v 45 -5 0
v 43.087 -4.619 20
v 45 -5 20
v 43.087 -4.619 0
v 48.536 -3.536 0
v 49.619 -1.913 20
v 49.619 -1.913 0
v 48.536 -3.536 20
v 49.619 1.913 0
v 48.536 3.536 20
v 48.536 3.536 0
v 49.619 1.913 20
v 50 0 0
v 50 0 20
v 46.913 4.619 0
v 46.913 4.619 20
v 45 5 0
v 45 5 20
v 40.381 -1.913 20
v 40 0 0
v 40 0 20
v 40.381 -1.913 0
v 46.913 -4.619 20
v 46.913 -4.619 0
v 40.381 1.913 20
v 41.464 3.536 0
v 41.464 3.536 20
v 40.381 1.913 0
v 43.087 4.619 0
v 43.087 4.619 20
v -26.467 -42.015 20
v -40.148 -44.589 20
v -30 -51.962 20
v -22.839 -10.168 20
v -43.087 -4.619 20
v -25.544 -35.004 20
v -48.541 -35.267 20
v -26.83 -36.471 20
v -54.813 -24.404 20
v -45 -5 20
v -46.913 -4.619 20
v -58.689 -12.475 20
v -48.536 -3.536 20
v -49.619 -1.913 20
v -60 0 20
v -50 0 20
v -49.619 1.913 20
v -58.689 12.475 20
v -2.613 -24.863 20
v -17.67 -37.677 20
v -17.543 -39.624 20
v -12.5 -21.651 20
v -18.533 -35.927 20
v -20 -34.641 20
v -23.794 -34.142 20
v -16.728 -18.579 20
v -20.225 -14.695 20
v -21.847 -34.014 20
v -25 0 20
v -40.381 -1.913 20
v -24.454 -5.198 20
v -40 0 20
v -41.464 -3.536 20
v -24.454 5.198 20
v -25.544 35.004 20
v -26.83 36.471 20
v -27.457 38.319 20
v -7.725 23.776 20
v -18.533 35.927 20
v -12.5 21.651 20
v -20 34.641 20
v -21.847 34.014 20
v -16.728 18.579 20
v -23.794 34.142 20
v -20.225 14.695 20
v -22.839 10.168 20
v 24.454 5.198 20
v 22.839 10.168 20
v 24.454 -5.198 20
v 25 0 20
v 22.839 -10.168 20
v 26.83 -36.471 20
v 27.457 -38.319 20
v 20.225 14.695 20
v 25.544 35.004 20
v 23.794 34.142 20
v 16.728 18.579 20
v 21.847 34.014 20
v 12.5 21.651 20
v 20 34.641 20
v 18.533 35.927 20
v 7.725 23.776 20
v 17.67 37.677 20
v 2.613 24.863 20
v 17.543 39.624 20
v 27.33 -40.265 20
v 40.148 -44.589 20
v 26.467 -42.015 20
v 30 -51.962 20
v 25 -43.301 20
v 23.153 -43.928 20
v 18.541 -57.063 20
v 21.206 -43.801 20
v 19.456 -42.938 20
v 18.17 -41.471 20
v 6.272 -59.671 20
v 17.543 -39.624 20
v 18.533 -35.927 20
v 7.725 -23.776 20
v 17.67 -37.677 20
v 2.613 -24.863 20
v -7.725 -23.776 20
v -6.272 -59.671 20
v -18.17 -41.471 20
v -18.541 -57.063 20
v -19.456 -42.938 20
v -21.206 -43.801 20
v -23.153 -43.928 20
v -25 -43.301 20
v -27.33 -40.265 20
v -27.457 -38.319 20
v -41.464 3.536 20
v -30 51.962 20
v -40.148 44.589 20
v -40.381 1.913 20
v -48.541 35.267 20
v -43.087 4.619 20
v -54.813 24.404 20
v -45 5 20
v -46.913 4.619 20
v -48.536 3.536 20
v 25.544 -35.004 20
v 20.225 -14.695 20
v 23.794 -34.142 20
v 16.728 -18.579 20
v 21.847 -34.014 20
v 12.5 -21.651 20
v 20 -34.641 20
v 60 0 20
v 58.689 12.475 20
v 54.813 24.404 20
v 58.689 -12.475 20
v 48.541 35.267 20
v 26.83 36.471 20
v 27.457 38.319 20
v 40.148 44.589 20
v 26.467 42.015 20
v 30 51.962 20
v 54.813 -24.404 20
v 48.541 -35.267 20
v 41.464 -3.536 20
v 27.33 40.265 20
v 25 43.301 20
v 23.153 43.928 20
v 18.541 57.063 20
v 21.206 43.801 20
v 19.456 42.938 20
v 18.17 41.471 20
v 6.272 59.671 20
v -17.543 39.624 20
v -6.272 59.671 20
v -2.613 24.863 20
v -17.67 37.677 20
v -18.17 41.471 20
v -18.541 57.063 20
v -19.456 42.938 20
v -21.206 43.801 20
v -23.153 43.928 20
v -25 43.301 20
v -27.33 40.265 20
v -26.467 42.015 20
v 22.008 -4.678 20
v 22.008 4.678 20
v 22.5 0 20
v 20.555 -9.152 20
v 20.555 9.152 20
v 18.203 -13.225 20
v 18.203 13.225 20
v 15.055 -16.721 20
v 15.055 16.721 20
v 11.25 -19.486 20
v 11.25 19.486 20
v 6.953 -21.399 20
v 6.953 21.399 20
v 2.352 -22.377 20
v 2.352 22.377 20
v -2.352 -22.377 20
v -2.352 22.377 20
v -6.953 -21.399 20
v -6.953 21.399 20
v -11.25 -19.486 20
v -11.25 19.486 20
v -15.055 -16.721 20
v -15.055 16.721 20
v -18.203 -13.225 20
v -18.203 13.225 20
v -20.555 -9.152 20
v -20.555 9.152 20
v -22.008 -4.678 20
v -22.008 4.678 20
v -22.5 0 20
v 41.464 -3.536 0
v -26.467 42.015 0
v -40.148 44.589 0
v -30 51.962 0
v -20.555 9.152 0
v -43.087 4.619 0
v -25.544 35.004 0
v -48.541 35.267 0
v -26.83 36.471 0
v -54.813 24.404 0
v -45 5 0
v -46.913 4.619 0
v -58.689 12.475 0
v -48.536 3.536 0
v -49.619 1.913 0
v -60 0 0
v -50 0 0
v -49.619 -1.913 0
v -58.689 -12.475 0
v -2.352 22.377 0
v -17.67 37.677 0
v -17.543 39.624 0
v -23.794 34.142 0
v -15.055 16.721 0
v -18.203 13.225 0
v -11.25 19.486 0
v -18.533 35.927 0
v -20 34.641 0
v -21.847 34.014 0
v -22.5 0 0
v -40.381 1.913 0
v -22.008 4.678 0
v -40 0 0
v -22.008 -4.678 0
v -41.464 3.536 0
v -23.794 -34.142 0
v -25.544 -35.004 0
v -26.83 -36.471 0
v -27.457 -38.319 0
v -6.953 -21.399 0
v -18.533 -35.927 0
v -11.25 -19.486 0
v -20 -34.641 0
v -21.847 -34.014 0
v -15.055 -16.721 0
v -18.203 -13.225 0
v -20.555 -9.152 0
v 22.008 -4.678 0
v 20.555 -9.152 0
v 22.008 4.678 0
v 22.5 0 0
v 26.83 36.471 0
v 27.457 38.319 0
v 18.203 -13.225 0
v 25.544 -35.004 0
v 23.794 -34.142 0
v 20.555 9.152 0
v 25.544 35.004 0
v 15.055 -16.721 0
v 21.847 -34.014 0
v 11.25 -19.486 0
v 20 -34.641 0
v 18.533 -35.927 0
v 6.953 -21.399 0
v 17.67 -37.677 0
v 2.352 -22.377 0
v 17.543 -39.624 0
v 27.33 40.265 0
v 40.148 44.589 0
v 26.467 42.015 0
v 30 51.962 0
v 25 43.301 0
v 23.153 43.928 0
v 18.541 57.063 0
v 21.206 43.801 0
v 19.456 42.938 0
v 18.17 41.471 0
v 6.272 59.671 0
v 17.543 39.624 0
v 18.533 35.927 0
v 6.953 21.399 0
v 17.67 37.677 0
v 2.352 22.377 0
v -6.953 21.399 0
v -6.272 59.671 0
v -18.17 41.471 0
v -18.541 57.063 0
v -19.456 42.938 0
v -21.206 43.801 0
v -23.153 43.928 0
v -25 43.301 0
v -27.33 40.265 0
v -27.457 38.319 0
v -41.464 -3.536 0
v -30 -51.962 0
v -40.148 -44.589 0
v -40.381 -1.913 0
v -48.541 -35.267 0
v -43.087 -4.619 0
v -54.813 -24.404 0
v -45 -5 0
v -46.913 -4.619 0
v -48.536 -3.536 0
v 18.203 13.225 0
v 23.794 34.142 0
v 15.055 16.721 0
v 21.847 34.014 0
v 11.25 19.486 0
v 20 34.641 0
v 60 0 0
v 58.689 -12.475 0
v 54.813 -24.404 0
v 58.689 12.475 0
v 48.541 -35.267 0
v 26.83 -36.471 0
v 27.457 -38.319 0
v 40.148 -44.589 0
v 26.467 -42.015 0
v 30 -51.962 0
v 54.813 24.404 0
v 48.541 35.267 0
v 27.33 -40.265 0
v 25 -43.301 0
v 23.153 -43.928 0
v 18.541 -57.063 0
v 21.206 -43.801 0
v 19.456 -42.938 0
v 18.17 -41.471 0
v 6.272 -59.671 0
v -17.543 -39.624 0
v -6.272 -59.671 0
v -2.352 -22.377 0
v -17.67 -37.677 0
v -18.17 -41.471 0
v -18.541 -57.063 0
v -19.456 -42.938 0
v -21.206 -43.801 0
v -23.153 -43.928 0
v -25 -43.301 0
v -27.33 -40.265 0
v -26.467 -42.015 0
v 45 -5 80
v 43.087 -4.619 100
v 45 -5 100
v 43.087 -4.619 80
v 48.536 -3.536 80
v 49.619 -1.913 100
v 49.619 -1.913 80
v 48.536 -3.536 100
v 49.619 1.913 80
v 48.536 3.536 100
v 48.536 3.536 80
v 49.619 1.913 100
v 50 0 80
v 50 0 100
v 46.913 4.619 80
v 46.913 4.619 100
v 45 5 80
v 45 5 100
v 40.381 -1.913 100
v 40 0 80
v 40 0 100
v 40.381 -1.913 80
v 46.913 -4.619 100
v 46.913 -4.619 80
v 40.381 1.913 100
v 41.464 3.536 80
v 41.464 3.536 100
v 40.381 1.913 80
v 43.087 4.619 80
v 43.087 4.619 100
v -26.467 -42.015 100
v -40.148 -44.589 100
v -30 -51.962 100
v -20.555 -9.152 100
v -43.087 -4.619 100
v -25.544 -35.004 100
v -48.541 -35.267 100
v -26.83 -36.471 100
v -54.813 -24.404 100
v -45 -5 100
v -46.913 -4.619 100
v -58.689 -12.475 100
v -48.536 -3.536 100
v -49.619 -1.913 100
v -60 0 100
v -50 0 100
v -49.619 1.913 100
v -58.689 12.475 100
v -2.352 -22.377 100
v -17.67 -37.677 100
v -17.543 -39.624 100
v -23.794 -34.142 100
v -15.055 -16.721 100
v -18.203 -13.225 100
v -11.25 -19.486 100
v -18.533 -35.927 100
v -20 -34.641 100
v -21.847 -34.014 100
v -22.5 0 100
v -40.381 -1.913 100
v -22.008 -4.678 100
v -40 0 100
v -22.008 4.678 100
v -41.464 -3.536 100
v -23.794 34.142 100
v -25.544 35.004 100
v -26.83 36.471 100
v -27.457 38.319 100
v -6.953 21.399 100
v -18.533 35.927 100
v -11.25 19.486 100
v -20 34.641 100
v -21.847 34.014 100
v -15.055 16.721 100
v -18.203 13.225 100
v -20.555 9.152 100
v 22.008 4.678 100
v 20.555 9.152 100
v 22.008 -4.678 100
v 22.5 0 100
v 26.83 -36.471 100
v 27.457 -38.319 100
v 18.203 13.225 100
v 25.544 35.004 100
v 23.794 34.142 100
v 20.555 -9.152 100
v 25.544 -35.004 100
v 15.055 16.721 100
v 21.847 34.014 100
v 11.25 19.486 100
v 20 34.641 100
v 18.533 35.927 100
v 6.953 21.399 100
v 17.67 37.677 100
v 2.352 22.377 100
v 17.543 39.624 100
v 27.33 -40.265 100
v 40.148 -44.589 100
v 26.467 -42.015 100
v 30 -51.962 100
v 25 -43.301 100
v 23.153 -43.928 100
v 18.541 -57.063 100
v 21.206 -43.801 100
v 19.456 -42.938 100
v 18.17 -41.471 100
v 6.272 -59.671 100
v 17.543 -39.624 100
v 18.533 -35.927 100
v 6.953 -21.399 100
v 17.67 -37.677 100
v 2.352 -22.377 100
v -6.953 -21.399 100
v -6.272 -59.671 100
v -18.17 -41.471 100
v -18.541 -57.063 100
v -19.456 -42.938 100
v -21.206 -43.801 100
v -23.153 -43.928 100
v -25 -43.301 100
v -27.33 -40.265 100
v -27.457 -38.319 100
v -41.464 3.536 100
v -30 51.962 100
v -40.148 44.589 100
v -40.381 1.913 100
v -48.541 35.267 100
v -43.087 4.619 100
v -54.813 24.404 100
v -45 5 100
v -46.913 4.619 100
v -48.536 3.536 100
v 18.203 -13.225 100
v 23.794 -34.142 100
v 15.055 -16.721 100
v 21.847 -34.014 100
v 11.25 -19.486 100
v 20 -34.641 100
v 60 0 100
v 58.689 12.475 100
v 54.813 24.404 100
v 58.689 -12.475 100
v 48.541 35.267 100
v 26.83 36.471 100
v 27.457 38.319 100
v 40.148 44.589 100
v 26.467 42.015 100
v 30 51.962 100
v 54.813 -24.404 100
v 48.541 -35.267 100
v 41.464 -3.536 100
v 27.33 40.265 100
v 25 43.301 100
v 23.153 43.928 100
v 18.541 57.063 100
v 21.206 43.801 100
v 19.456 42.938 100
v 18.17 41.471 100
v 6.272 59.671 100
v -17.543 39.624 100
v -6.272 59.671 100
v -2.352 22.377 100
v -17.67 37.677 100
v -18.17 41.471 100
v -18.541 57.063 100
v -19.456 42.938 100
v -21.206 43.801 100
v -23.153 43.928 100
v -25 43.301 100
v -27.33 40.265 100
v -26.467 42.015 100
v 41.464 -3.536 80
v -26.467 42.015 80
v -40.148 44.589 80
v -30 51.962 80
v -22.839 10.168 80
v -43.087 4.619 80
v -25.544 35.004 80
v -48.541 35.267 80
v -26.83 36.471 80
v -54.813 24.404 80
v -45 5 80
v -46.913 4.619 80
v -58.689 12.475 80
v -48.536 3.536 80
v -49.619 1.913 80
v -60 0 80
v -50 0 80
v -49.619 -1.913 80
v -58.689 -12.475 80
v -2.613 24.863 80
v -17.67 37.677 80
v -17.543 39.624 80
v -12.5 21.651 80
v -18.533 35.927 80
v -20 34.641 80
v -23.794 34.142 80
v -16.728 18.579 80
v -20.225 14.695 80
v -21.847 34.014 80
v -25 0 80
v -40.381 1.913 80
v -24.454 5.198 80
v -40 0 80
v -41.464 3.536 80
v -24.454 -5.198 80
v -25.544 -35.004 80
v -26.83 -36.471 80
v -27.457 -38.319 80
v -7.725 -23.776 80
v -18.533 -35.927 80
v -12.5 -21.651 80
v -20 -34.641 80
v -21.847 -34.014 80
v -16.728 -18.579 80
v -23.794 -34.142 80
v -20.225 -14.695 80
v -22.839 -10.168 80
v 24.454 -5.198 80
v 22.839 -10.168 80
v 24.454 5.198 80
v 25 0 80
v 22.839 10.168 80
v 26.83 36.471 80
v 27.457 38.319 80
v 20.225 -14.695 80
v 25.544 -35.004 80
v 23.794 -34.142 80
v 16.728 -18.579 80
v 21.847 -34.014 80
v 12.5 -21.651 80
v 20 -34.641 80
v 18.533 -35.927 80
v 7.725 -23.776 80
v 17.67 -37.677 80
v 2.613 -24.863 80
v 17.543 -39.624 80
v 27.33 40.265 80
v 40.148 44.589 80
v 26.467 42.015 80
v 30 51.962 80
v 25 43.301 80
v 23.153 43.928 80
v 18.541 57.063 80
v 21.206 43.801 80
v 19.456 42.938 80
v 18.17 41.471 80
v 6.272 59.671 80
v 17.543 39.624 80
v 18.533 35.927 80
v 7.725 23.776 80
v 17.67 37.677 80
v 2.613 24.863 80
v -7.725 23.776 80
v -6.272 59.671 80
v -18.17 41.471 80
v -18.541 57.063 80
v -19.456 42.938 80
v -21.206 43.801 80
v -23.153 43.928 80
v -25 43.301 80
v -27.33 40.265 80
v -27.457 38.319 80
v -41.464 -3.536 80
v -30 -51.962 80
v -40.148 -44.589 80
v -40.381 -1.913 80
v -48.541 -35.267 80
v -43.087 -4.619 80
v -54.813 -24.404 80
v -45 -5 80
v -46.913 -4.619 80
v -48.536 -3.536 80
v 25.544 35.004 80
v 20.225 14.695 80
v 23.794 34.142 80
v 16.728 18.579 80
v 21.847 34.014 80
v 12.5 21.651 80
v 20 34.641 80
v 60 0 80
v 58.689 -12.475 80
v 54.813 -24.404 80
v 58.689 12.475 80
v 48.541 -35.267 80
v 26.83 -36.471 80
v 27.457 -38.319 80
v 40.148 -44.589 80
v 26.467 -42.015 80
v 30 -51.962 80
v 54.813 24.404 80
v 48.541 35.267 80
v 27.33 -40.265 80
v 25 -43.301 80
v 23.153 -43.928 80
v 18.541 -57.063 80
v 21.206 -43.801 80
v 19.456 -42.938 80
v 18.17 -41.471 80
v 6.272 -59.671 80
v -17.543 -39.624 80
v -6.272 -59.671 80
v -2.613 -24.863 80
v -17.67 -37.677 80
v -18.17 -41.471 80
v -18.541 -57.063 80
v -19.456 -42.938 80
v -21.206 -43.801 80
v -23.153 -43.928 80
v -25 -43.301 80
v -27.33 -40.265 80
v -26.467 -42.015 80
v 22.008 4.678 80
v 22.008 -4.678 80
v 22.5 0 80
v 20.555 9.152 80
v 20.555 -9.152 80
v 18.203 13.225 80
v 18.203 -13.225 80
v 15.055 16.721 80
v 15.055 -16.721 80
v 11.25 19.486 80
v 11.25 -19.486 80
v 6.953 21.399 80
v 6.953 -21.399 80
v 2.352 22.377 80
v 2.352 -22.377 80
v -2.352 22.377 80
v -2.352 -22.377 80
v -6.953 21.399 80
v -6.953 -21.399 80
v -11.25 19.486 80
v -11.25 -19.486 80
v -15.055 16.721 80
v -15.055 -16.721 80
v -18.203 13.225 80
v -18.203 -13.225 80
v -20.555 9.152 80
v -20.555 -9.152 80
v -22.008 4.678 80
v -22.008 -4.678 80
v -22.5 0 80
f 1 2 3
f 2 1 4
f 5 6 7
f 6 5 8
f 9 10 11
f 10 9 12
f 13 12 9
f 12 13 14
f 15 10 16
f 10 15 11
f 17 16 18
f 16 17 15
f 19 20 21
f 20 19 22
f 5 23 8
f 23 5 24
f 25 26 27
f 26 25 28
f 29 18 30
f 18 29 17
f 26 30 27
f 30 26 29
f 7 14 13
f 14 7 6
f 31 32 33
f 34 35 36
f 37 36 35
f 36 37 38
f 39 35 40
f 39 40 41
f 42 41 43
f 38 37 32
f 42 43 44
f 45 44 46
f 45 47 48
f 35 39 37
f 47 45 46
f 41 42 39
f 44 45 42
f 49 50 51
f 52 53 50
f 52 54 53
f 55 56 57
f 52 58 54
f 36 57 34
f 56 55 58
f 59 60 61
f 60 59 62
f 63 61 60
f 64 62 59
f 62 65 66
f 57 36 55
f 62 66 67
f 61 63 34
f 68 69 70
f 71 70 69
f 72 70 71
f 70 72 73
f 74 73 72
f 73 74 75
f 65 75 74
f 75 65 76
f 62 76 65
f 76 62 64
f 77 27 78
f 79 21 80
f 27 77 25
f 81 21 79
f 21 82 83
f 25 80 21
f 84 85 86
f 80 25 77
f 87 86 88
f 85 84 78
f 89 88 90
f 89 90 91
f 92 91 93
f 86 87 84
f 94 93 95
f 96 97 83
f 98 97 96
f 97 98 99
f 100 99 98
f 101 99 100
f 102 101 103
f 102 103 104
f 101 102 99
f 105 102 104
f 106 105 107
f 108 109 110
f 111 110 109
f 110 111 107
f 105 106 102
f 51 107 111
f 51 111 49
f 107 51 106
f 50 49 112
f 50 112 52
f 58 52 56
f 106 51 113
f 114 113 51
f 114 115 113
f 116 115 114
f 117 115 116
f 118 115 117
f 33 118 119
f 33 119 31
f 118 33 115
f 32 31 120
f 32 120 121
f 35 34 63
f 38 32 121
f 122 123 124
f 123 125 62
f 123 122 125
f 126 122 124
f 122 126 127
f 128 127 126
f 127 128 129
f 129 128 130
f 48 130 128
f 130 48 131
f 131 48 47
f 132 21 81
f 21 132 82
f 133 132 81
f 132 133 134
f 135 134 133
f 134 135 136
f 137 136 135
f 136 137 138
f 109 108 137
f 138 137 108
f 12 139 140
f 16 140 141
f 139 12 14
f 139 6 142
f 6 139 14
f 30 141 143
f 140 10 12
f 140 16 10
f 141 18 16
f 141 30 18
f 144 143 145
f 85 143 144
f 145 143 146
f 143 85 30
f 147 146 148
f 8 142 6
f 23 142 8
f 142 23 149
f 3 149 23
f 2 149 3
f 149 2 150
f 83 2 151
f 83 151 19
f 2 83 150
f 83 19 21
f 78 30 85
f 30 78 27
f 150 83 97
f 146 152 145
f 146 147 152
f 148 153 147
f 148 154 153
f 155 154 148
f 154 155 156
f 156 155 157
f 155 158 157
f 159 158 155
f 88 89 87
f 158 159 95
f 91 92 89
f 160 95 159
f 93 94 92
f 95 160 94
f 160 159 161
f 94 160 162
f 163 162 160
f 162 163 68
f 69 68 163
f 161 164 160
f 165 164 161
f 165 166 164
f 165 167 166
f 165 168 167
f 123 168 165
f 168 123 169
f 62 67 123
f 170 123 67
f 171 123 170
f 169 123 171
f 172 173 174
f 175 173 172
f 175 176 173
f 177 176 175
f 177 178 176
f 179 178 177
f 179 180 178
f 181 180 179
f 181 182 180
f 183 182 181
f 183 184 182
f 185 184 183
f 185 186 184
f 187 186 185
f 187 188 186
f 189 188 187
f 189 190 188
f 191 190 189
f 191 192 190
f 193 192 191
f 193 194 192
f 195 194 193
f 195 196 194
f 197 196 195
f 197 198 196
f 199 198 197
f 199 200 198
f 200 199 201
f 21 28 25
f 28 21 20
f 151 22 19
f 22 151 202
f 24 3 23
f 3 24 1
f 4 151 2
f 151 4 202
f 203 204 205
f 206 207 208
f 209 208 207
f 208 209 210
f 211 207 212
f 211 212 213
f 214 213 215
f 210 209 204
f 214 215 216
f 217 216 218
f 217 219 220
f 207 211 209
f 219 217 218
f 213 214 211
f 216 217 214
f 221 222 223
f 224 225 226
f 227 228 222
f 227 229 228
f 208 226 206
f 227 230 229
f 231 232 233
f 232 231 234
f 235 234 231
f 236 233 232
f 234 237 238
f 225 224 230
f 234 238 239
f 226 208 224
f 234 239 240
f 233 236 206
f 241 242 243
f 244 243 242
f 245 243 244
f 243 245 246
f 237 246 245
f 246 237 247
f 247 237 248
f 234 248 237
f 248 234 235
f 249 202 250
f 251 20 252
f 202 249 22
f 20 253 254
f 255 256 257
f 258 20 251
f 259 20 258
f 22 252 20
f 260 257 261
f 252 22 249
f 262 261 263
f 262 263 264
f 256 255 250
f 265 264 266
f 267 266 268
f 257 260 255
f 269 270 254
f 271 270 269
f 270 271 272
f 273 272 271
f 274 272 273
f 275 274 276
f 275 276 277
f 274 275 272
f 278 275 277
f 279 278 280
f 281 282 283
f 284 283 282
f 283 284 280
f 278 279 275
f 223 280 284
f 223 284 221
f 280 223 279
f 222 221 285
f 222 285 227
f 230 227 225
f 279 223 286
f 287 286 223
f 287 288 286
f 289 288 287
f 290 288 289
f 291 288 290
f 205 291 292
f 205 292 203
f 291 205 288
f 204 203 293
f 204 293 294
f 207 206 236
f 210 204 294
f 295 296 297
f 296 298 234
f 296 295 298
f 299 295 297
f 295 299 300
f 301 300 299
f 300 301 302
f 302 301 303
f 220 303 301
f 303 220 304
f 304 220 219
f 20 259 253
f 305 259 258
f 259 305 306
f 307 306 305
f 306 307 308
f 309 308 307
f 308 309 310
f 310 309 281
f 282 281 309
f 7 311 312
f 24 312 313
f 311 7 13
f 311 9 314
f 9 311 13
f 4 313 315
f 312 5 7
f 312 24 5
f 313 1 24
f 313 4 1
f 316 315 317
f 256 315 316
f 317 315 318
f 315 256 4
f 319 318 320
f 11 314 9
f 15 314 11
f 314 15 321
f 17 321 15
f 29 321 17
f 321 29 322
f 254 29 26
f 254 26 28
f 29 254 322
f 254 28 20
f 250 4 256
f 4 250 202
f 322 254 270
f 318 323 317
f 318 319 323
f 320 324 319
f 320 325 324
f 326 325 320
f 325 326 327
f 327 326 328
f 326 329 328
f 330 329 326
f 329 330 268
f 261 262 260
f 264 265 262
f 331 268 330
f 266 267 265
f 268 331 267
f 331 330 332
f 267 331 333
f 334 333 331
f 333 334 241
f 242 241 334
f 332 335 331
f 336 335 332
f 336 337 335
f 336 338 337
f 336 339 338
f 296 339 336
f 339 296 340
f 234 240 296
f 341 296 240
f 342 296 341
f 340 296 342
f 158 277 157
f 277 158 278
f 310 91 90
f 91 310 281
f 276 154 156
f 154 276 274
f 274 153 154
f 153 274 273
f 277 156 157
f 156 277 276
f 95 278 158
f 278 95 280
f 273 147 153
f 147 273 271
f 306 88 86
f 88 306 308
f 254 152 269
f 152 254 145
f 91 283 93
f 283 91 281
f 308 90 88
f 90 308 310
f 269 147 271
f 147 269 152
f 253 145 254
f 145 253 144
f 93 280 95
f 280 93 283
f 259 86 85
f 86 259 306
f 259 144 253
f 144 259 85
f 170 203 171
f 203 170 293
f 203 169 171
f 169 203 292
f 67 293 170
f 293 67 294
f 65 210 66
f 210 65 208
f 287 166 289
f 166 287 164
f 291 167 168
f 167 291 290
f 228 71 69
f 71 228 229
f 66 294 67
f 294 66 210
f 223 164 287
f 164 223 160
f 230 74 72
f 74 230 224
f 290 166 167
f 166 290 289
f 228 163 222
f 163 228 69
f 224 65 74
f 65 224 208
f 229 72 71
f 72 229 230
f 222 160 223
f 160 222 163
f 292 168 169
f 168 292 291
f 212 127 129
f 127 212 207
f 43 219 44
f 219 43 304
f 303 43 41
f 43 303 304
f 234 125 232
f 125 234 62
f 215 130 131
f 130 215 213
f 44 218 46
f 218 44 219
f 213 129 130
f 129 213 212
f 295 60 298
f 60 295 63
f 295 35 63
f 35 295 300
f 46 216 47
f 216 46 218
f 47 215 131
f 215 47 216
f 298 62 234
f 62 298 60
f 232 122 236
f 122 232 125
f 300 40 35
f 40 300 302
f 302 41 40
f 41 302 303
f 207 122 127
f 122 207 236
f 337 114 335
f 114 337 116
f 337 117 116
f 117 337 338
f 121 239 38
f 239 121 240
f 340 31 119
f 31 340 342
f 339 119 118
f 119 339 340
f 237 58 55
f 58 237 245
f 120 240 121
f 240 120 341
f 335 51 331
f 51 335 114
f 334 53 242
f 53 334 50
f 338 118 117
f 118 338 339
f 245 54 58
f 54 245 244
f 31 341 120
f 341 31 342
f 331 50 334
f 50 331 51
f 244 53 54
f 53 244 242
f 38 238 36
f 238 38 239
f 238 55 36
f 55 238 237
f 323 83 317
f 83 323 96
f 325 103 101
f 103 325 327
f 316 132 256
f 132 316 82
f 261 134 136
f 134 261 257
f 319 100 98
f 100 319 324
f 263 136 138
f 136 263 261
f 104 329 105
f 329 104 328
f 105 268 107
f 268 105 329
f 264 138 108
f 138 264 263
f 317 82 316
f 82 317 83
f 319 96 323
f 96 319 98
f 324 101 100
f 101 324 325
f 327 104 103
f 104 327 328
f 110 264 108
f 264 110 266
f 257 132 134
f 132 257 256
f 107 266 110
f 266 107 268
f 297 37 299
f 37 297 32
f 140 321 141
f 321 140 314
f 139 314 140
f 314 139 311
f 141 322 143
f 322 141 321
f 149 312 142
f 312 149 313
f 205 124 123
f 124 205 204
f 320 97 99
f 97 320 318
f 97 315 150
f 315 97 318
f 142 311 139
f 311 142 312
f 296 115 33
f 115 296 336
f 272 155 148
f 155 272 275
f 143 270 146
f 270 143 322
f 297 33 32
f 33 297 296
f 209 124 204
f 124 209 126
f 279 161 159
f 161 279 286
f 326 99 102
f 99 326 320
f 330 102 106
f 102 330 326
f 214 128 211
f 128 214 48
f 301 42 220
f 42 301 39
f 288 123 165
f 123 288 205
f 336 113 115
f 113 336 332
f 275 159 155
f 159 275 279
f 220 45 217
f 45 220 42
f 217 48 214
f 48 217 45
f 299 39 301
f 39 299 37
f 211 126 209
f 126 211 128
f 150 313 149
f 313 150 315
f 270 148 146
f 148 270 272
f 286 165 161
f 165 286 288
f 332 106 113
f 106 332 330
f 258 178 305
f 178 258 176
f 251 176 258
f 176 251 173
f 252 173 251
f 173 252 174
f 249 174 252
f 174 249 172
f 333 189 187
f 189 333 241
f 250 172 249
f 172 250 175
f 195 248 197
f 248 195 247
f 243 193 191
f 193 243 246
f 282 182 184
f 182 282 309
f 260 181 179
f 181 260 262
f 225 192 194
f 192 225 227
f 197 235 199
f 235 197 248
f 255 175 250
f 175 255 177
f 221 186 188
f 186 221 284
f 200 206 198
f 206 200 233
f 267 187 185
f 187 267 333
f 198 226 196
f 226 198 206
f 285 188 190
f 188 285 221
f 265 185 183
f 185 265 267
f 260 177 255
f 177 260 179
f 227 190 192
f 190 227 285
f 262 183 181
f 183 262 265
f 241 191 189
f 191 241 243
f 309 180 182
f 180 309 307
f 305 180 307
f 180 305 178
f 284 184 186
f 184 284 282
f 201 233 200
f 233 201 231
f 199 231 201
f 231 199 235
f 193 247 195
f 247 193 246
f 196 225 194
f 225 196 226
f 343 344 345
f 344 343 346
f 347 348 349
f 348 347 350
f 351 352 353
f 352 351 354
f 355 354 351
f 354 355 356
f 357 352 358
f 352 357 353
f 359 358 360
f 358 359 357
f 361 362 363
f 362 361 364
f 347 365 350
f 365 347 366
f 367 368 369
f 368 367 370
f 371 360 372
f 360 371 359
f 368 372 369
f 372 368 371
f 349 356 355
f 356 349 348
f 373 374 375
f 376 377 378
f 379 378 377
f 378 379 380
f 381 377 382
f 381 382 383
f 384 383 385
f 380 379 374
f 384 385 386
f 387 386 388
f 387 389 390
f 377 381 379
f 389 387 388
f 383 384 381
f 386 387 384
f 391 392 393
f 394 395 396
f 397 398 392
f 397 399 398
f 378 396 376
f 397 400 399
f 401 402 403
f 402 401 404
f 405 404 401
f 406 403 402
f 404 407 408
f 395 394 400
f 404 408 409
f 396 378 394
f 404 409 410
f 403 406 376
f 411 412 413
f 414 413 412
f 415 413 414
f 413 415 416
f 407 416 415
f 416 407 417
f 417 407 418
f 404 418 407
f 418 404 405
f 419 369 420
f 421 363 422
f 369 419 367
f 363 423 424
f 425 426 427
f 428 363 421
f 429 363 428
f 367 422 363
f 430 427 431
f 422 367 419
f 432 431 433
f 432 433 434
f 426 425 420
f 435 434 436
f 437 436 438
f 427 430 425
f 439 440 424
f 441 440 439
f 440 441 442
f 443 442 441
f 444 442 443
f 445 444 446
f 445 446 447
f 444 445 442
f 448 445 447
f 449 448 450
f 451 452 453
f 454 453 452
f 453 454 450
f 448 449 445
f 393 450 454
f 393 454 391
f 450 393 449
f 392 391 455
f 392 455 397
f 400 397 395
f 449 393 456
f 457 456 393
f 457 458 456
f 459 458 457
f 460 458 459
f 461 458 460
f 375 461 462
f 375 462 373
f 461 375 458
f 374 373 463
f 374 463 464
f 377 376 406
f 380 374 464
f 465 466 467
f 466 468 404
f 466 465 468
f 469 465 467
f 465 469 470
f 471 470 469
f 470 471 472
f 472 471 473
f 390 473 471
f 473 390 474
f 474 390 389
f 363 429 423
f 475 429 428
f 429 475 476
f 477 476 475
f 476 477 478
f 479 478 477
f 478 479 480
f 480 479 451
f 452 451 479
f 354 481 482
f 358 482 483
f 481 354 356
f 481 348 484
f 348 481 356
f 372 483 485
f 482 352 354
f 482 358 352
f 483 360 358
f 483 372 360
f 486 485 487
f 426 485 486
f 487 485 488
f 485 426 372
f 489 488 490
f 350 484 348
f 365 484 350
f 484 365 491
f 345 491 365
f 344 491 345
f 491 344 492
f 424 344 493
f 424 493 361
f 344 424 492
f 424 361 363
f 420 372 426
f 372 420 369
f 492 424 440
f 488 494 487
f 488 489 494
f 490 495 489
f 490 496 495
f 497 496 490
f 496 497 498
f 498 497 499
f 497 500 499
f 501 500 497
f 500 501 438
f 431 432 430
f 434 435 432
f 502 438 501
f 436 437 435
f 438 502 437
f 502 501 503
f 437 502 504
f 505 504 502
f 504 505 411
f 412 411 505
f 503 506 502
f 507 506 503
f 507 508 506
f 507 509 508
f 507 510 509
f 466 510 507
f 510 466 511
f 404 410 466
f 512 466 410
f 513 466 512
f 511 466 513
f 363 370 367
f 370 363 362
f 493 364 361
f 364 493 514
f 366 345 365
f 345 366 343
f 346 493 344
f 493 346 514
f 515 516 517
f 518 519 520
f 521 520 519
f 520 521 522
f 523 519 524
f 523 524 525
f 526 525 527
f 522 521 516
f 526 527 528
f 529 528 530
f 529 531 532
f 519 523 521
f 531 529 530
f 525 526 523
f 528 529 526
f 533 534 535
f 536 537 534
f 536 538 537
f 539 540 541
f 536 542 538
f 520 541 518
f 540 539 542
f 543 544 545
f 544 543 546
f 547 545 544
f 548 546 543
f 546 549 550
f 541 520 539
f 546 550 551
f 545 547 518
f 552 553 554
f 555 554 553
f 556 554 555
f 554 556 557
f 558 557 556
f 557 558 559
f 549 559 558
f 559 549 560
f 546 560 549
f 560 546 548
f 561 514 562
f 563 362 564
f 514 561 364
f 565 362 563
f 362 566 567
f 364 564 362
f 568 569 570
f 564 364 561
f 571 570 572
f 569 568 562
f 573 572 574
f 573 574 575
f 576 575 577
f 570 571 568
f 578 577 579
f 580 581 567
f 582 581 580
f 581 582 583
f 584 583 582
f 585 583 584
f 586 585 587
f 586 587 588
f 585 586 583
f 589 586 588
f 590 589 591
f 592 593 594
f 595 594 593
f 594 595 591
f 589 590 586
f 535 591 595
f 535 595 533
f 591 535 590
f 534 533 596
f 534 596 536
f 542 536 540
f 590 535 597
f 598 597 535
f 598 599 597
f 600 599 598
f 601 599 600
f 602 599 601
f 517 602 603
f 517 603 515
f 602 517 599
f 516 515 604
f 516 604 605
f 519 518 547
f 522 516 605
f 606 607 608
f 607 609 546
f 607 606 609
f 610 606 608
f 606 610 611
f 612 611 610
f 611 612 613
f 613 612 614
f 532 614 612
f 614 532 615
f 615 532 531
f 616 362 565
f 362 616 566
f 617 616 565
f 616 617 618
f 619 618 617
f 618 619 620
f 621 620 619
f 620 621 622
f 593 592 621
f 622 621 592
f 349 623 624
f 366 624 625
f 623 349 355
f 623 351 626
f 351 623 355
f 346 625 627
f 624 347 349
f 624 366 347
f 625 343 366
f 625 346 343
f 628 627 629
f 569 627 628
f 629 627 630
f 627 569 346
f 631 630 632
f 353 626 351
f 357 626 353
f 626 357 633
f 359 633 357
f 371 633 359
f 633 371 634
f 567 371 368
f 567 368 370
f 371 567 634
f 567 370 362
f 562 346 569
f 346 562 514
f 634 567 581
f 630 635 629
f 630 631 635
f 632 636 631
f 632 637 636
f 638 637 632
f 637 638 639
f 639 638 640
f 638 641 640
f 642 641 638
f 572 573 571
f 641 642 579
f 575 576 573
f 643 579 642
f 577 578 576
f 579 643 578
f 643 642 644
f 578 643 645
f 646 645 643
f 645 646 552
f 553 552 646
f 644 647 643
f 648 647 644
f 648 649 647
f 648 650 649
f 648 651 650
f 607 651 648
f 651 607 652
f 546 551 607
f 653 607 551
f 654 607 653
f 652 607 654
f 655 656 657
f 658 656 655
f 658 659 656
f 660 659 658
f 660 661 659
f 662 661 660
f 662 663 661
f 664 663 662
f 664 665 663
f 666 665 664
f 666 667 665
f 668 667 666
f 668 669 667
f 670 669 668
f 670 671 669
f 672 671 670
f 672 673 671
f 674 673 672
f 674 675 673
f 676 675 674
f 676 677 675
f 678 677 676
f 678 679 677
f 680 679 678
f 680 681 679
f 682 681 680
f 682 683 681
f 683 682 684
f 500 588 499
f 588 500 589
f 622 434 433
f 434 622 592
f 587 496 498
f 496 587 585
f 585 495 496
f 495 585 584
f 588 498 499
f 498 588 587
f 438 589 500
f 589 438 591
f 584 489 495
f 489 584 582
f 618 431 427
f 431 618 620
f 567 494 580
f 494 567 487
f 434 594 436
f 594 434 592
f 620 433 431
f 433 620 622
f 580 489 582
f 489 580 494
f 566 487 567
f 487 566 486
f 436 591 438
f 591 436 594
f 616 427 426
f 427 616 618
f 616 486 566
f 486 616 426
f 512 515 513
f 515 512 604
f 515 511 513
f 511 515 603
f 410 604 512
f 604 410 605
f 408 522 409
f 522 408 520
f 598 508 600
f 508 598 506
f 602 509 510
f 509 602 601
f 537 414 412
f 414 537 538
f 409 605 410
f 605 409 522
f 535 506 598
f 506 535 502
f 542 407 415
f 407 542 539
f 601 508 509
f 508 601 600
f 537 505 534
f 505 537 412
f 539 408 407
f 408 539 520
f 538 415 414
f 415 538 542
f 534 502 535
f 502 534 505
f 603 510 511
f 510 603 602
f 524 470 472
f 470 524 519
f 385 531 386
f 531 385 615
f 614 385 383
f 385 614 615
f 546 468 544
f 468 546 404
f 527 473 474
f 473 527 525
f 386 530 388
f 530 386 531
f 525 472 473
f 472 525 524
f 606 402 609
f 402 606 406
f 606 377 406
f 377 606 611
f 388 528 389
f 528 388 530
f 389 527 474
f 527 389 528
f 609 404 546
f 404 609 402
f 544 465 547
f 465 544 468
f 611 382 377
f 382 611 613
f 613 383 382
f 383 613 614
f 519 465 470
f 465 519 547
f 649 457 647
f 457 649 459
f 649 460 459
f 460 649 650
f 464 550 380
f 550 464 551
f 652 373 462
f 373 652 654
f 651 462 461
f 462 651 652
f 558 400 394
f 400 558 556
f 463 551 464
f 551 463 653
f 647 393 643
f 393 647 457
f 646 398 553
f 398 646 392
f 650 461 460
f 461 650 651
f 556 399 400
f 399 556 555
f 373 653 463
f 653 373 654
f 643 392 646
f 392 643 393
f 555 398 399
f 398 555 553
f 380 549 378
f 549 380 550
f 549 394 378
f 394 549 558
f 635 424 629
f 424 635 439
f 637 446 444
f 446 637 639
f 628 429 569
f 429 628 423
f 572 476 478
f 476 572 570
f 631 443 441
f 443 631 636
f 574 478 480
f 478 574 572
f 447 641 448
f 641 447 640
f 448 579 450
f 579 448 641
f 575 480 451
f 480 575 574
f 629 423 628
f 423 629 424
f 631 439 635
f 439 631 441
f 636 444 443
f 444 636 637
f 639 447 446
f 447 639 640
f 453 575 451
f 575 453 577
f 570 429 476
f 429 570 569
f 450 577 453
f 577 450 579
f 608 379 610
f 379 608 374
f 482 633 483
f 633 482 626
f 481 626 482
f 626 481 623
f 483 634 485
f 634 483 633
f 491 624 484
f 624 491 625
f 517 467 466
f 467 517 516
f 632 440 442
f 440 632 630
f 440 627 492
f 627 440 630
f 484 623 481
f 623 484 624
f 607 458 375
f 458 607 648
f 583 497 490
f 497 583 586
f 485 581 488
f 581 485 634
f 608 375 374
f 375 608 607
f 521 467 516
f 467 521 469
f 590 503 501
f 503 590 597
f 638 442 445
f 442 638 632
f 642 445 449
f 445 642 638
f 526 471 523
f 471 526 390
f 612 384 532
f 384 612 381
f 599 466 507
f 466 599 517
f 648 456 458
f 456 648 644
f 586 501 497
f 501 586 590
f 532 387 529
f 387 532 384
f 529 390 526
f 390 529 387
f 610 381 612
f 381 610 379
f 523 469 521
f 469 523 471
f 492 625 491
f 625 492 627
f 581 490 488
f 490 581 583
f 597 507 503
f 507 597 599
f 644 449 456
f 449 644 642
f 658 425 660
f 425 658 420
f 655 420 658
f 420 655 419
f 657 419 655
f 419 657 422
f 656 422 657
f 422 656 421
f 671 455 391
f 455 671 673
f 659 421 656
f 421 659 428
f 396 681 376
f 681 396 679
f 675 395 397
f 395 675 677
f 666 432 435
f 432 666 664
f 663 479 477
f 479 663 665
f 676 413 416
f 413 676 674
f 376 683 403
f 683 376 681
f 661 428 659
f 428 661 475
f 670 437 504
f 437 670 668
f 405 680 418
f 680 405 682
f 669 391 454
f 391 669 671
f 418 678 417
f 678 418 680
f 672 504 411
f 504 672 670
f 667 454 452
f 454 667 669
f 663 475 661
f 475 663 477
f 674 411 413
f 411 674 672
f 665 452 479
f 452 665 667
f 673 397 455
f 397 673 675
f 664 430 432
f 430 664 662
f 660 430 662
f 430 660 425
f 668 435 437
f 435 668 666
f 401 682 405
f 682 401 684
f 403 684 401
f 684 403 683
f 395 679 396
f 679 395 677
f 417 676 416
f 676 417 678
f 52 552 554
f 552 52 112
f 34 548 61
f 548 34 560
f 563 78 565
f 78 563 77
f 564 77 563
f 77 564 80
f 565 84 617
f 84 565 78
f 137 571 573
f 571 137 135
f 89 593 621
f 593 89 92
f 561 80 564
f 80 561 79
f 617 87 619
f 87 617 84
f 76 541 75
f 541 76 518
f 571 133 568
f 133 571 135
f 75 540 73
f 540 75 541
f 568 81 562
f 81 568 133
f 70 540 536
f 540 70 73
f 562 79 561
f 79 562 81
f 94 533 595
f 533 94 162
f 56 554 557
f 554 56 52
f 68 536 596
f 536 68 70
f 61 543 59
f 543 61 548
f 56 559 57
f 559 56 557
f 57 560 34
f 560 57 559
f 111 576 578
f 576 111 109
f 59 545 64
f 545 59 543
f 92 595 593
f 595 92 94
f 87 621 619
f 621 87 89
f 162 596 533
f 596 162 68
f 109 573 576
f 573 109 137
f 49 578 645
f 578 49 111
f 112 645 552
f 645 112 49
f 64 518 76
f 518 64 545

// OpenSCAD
// file: ../../lib/plate_with_holes.scad
module plate_with_holes(r_outer, r_inner, r_middle, r_hole, numbers_hole, thickness) {
    difference() {
        cylinder(thickness, r_outer, r_outer);
        cylinder(thickness, r_inner, r_inner);
        for (i=[0:360/numbers_hole:(360-360/numbers_hole)]) {
            rotate([0,0,i])
            translate([r_middle,0,0])
            cylinder(thickness, r_hole, r_hole);
        }
    }
}
// main file
use <../../lib/plate_with_holes.scad>

// plate_with_holes(r_outer, r_inner, r_middle, r_hole, numbers_hole, thickness)

plate_with_holes(60, 22.5, 45, 5, 6, 20);

translate([0,0,20])
cylinder(60,25,25);

translate([0,0,80])
plate_with_holes(60, 22.5, 45, 5, 6, 20);
